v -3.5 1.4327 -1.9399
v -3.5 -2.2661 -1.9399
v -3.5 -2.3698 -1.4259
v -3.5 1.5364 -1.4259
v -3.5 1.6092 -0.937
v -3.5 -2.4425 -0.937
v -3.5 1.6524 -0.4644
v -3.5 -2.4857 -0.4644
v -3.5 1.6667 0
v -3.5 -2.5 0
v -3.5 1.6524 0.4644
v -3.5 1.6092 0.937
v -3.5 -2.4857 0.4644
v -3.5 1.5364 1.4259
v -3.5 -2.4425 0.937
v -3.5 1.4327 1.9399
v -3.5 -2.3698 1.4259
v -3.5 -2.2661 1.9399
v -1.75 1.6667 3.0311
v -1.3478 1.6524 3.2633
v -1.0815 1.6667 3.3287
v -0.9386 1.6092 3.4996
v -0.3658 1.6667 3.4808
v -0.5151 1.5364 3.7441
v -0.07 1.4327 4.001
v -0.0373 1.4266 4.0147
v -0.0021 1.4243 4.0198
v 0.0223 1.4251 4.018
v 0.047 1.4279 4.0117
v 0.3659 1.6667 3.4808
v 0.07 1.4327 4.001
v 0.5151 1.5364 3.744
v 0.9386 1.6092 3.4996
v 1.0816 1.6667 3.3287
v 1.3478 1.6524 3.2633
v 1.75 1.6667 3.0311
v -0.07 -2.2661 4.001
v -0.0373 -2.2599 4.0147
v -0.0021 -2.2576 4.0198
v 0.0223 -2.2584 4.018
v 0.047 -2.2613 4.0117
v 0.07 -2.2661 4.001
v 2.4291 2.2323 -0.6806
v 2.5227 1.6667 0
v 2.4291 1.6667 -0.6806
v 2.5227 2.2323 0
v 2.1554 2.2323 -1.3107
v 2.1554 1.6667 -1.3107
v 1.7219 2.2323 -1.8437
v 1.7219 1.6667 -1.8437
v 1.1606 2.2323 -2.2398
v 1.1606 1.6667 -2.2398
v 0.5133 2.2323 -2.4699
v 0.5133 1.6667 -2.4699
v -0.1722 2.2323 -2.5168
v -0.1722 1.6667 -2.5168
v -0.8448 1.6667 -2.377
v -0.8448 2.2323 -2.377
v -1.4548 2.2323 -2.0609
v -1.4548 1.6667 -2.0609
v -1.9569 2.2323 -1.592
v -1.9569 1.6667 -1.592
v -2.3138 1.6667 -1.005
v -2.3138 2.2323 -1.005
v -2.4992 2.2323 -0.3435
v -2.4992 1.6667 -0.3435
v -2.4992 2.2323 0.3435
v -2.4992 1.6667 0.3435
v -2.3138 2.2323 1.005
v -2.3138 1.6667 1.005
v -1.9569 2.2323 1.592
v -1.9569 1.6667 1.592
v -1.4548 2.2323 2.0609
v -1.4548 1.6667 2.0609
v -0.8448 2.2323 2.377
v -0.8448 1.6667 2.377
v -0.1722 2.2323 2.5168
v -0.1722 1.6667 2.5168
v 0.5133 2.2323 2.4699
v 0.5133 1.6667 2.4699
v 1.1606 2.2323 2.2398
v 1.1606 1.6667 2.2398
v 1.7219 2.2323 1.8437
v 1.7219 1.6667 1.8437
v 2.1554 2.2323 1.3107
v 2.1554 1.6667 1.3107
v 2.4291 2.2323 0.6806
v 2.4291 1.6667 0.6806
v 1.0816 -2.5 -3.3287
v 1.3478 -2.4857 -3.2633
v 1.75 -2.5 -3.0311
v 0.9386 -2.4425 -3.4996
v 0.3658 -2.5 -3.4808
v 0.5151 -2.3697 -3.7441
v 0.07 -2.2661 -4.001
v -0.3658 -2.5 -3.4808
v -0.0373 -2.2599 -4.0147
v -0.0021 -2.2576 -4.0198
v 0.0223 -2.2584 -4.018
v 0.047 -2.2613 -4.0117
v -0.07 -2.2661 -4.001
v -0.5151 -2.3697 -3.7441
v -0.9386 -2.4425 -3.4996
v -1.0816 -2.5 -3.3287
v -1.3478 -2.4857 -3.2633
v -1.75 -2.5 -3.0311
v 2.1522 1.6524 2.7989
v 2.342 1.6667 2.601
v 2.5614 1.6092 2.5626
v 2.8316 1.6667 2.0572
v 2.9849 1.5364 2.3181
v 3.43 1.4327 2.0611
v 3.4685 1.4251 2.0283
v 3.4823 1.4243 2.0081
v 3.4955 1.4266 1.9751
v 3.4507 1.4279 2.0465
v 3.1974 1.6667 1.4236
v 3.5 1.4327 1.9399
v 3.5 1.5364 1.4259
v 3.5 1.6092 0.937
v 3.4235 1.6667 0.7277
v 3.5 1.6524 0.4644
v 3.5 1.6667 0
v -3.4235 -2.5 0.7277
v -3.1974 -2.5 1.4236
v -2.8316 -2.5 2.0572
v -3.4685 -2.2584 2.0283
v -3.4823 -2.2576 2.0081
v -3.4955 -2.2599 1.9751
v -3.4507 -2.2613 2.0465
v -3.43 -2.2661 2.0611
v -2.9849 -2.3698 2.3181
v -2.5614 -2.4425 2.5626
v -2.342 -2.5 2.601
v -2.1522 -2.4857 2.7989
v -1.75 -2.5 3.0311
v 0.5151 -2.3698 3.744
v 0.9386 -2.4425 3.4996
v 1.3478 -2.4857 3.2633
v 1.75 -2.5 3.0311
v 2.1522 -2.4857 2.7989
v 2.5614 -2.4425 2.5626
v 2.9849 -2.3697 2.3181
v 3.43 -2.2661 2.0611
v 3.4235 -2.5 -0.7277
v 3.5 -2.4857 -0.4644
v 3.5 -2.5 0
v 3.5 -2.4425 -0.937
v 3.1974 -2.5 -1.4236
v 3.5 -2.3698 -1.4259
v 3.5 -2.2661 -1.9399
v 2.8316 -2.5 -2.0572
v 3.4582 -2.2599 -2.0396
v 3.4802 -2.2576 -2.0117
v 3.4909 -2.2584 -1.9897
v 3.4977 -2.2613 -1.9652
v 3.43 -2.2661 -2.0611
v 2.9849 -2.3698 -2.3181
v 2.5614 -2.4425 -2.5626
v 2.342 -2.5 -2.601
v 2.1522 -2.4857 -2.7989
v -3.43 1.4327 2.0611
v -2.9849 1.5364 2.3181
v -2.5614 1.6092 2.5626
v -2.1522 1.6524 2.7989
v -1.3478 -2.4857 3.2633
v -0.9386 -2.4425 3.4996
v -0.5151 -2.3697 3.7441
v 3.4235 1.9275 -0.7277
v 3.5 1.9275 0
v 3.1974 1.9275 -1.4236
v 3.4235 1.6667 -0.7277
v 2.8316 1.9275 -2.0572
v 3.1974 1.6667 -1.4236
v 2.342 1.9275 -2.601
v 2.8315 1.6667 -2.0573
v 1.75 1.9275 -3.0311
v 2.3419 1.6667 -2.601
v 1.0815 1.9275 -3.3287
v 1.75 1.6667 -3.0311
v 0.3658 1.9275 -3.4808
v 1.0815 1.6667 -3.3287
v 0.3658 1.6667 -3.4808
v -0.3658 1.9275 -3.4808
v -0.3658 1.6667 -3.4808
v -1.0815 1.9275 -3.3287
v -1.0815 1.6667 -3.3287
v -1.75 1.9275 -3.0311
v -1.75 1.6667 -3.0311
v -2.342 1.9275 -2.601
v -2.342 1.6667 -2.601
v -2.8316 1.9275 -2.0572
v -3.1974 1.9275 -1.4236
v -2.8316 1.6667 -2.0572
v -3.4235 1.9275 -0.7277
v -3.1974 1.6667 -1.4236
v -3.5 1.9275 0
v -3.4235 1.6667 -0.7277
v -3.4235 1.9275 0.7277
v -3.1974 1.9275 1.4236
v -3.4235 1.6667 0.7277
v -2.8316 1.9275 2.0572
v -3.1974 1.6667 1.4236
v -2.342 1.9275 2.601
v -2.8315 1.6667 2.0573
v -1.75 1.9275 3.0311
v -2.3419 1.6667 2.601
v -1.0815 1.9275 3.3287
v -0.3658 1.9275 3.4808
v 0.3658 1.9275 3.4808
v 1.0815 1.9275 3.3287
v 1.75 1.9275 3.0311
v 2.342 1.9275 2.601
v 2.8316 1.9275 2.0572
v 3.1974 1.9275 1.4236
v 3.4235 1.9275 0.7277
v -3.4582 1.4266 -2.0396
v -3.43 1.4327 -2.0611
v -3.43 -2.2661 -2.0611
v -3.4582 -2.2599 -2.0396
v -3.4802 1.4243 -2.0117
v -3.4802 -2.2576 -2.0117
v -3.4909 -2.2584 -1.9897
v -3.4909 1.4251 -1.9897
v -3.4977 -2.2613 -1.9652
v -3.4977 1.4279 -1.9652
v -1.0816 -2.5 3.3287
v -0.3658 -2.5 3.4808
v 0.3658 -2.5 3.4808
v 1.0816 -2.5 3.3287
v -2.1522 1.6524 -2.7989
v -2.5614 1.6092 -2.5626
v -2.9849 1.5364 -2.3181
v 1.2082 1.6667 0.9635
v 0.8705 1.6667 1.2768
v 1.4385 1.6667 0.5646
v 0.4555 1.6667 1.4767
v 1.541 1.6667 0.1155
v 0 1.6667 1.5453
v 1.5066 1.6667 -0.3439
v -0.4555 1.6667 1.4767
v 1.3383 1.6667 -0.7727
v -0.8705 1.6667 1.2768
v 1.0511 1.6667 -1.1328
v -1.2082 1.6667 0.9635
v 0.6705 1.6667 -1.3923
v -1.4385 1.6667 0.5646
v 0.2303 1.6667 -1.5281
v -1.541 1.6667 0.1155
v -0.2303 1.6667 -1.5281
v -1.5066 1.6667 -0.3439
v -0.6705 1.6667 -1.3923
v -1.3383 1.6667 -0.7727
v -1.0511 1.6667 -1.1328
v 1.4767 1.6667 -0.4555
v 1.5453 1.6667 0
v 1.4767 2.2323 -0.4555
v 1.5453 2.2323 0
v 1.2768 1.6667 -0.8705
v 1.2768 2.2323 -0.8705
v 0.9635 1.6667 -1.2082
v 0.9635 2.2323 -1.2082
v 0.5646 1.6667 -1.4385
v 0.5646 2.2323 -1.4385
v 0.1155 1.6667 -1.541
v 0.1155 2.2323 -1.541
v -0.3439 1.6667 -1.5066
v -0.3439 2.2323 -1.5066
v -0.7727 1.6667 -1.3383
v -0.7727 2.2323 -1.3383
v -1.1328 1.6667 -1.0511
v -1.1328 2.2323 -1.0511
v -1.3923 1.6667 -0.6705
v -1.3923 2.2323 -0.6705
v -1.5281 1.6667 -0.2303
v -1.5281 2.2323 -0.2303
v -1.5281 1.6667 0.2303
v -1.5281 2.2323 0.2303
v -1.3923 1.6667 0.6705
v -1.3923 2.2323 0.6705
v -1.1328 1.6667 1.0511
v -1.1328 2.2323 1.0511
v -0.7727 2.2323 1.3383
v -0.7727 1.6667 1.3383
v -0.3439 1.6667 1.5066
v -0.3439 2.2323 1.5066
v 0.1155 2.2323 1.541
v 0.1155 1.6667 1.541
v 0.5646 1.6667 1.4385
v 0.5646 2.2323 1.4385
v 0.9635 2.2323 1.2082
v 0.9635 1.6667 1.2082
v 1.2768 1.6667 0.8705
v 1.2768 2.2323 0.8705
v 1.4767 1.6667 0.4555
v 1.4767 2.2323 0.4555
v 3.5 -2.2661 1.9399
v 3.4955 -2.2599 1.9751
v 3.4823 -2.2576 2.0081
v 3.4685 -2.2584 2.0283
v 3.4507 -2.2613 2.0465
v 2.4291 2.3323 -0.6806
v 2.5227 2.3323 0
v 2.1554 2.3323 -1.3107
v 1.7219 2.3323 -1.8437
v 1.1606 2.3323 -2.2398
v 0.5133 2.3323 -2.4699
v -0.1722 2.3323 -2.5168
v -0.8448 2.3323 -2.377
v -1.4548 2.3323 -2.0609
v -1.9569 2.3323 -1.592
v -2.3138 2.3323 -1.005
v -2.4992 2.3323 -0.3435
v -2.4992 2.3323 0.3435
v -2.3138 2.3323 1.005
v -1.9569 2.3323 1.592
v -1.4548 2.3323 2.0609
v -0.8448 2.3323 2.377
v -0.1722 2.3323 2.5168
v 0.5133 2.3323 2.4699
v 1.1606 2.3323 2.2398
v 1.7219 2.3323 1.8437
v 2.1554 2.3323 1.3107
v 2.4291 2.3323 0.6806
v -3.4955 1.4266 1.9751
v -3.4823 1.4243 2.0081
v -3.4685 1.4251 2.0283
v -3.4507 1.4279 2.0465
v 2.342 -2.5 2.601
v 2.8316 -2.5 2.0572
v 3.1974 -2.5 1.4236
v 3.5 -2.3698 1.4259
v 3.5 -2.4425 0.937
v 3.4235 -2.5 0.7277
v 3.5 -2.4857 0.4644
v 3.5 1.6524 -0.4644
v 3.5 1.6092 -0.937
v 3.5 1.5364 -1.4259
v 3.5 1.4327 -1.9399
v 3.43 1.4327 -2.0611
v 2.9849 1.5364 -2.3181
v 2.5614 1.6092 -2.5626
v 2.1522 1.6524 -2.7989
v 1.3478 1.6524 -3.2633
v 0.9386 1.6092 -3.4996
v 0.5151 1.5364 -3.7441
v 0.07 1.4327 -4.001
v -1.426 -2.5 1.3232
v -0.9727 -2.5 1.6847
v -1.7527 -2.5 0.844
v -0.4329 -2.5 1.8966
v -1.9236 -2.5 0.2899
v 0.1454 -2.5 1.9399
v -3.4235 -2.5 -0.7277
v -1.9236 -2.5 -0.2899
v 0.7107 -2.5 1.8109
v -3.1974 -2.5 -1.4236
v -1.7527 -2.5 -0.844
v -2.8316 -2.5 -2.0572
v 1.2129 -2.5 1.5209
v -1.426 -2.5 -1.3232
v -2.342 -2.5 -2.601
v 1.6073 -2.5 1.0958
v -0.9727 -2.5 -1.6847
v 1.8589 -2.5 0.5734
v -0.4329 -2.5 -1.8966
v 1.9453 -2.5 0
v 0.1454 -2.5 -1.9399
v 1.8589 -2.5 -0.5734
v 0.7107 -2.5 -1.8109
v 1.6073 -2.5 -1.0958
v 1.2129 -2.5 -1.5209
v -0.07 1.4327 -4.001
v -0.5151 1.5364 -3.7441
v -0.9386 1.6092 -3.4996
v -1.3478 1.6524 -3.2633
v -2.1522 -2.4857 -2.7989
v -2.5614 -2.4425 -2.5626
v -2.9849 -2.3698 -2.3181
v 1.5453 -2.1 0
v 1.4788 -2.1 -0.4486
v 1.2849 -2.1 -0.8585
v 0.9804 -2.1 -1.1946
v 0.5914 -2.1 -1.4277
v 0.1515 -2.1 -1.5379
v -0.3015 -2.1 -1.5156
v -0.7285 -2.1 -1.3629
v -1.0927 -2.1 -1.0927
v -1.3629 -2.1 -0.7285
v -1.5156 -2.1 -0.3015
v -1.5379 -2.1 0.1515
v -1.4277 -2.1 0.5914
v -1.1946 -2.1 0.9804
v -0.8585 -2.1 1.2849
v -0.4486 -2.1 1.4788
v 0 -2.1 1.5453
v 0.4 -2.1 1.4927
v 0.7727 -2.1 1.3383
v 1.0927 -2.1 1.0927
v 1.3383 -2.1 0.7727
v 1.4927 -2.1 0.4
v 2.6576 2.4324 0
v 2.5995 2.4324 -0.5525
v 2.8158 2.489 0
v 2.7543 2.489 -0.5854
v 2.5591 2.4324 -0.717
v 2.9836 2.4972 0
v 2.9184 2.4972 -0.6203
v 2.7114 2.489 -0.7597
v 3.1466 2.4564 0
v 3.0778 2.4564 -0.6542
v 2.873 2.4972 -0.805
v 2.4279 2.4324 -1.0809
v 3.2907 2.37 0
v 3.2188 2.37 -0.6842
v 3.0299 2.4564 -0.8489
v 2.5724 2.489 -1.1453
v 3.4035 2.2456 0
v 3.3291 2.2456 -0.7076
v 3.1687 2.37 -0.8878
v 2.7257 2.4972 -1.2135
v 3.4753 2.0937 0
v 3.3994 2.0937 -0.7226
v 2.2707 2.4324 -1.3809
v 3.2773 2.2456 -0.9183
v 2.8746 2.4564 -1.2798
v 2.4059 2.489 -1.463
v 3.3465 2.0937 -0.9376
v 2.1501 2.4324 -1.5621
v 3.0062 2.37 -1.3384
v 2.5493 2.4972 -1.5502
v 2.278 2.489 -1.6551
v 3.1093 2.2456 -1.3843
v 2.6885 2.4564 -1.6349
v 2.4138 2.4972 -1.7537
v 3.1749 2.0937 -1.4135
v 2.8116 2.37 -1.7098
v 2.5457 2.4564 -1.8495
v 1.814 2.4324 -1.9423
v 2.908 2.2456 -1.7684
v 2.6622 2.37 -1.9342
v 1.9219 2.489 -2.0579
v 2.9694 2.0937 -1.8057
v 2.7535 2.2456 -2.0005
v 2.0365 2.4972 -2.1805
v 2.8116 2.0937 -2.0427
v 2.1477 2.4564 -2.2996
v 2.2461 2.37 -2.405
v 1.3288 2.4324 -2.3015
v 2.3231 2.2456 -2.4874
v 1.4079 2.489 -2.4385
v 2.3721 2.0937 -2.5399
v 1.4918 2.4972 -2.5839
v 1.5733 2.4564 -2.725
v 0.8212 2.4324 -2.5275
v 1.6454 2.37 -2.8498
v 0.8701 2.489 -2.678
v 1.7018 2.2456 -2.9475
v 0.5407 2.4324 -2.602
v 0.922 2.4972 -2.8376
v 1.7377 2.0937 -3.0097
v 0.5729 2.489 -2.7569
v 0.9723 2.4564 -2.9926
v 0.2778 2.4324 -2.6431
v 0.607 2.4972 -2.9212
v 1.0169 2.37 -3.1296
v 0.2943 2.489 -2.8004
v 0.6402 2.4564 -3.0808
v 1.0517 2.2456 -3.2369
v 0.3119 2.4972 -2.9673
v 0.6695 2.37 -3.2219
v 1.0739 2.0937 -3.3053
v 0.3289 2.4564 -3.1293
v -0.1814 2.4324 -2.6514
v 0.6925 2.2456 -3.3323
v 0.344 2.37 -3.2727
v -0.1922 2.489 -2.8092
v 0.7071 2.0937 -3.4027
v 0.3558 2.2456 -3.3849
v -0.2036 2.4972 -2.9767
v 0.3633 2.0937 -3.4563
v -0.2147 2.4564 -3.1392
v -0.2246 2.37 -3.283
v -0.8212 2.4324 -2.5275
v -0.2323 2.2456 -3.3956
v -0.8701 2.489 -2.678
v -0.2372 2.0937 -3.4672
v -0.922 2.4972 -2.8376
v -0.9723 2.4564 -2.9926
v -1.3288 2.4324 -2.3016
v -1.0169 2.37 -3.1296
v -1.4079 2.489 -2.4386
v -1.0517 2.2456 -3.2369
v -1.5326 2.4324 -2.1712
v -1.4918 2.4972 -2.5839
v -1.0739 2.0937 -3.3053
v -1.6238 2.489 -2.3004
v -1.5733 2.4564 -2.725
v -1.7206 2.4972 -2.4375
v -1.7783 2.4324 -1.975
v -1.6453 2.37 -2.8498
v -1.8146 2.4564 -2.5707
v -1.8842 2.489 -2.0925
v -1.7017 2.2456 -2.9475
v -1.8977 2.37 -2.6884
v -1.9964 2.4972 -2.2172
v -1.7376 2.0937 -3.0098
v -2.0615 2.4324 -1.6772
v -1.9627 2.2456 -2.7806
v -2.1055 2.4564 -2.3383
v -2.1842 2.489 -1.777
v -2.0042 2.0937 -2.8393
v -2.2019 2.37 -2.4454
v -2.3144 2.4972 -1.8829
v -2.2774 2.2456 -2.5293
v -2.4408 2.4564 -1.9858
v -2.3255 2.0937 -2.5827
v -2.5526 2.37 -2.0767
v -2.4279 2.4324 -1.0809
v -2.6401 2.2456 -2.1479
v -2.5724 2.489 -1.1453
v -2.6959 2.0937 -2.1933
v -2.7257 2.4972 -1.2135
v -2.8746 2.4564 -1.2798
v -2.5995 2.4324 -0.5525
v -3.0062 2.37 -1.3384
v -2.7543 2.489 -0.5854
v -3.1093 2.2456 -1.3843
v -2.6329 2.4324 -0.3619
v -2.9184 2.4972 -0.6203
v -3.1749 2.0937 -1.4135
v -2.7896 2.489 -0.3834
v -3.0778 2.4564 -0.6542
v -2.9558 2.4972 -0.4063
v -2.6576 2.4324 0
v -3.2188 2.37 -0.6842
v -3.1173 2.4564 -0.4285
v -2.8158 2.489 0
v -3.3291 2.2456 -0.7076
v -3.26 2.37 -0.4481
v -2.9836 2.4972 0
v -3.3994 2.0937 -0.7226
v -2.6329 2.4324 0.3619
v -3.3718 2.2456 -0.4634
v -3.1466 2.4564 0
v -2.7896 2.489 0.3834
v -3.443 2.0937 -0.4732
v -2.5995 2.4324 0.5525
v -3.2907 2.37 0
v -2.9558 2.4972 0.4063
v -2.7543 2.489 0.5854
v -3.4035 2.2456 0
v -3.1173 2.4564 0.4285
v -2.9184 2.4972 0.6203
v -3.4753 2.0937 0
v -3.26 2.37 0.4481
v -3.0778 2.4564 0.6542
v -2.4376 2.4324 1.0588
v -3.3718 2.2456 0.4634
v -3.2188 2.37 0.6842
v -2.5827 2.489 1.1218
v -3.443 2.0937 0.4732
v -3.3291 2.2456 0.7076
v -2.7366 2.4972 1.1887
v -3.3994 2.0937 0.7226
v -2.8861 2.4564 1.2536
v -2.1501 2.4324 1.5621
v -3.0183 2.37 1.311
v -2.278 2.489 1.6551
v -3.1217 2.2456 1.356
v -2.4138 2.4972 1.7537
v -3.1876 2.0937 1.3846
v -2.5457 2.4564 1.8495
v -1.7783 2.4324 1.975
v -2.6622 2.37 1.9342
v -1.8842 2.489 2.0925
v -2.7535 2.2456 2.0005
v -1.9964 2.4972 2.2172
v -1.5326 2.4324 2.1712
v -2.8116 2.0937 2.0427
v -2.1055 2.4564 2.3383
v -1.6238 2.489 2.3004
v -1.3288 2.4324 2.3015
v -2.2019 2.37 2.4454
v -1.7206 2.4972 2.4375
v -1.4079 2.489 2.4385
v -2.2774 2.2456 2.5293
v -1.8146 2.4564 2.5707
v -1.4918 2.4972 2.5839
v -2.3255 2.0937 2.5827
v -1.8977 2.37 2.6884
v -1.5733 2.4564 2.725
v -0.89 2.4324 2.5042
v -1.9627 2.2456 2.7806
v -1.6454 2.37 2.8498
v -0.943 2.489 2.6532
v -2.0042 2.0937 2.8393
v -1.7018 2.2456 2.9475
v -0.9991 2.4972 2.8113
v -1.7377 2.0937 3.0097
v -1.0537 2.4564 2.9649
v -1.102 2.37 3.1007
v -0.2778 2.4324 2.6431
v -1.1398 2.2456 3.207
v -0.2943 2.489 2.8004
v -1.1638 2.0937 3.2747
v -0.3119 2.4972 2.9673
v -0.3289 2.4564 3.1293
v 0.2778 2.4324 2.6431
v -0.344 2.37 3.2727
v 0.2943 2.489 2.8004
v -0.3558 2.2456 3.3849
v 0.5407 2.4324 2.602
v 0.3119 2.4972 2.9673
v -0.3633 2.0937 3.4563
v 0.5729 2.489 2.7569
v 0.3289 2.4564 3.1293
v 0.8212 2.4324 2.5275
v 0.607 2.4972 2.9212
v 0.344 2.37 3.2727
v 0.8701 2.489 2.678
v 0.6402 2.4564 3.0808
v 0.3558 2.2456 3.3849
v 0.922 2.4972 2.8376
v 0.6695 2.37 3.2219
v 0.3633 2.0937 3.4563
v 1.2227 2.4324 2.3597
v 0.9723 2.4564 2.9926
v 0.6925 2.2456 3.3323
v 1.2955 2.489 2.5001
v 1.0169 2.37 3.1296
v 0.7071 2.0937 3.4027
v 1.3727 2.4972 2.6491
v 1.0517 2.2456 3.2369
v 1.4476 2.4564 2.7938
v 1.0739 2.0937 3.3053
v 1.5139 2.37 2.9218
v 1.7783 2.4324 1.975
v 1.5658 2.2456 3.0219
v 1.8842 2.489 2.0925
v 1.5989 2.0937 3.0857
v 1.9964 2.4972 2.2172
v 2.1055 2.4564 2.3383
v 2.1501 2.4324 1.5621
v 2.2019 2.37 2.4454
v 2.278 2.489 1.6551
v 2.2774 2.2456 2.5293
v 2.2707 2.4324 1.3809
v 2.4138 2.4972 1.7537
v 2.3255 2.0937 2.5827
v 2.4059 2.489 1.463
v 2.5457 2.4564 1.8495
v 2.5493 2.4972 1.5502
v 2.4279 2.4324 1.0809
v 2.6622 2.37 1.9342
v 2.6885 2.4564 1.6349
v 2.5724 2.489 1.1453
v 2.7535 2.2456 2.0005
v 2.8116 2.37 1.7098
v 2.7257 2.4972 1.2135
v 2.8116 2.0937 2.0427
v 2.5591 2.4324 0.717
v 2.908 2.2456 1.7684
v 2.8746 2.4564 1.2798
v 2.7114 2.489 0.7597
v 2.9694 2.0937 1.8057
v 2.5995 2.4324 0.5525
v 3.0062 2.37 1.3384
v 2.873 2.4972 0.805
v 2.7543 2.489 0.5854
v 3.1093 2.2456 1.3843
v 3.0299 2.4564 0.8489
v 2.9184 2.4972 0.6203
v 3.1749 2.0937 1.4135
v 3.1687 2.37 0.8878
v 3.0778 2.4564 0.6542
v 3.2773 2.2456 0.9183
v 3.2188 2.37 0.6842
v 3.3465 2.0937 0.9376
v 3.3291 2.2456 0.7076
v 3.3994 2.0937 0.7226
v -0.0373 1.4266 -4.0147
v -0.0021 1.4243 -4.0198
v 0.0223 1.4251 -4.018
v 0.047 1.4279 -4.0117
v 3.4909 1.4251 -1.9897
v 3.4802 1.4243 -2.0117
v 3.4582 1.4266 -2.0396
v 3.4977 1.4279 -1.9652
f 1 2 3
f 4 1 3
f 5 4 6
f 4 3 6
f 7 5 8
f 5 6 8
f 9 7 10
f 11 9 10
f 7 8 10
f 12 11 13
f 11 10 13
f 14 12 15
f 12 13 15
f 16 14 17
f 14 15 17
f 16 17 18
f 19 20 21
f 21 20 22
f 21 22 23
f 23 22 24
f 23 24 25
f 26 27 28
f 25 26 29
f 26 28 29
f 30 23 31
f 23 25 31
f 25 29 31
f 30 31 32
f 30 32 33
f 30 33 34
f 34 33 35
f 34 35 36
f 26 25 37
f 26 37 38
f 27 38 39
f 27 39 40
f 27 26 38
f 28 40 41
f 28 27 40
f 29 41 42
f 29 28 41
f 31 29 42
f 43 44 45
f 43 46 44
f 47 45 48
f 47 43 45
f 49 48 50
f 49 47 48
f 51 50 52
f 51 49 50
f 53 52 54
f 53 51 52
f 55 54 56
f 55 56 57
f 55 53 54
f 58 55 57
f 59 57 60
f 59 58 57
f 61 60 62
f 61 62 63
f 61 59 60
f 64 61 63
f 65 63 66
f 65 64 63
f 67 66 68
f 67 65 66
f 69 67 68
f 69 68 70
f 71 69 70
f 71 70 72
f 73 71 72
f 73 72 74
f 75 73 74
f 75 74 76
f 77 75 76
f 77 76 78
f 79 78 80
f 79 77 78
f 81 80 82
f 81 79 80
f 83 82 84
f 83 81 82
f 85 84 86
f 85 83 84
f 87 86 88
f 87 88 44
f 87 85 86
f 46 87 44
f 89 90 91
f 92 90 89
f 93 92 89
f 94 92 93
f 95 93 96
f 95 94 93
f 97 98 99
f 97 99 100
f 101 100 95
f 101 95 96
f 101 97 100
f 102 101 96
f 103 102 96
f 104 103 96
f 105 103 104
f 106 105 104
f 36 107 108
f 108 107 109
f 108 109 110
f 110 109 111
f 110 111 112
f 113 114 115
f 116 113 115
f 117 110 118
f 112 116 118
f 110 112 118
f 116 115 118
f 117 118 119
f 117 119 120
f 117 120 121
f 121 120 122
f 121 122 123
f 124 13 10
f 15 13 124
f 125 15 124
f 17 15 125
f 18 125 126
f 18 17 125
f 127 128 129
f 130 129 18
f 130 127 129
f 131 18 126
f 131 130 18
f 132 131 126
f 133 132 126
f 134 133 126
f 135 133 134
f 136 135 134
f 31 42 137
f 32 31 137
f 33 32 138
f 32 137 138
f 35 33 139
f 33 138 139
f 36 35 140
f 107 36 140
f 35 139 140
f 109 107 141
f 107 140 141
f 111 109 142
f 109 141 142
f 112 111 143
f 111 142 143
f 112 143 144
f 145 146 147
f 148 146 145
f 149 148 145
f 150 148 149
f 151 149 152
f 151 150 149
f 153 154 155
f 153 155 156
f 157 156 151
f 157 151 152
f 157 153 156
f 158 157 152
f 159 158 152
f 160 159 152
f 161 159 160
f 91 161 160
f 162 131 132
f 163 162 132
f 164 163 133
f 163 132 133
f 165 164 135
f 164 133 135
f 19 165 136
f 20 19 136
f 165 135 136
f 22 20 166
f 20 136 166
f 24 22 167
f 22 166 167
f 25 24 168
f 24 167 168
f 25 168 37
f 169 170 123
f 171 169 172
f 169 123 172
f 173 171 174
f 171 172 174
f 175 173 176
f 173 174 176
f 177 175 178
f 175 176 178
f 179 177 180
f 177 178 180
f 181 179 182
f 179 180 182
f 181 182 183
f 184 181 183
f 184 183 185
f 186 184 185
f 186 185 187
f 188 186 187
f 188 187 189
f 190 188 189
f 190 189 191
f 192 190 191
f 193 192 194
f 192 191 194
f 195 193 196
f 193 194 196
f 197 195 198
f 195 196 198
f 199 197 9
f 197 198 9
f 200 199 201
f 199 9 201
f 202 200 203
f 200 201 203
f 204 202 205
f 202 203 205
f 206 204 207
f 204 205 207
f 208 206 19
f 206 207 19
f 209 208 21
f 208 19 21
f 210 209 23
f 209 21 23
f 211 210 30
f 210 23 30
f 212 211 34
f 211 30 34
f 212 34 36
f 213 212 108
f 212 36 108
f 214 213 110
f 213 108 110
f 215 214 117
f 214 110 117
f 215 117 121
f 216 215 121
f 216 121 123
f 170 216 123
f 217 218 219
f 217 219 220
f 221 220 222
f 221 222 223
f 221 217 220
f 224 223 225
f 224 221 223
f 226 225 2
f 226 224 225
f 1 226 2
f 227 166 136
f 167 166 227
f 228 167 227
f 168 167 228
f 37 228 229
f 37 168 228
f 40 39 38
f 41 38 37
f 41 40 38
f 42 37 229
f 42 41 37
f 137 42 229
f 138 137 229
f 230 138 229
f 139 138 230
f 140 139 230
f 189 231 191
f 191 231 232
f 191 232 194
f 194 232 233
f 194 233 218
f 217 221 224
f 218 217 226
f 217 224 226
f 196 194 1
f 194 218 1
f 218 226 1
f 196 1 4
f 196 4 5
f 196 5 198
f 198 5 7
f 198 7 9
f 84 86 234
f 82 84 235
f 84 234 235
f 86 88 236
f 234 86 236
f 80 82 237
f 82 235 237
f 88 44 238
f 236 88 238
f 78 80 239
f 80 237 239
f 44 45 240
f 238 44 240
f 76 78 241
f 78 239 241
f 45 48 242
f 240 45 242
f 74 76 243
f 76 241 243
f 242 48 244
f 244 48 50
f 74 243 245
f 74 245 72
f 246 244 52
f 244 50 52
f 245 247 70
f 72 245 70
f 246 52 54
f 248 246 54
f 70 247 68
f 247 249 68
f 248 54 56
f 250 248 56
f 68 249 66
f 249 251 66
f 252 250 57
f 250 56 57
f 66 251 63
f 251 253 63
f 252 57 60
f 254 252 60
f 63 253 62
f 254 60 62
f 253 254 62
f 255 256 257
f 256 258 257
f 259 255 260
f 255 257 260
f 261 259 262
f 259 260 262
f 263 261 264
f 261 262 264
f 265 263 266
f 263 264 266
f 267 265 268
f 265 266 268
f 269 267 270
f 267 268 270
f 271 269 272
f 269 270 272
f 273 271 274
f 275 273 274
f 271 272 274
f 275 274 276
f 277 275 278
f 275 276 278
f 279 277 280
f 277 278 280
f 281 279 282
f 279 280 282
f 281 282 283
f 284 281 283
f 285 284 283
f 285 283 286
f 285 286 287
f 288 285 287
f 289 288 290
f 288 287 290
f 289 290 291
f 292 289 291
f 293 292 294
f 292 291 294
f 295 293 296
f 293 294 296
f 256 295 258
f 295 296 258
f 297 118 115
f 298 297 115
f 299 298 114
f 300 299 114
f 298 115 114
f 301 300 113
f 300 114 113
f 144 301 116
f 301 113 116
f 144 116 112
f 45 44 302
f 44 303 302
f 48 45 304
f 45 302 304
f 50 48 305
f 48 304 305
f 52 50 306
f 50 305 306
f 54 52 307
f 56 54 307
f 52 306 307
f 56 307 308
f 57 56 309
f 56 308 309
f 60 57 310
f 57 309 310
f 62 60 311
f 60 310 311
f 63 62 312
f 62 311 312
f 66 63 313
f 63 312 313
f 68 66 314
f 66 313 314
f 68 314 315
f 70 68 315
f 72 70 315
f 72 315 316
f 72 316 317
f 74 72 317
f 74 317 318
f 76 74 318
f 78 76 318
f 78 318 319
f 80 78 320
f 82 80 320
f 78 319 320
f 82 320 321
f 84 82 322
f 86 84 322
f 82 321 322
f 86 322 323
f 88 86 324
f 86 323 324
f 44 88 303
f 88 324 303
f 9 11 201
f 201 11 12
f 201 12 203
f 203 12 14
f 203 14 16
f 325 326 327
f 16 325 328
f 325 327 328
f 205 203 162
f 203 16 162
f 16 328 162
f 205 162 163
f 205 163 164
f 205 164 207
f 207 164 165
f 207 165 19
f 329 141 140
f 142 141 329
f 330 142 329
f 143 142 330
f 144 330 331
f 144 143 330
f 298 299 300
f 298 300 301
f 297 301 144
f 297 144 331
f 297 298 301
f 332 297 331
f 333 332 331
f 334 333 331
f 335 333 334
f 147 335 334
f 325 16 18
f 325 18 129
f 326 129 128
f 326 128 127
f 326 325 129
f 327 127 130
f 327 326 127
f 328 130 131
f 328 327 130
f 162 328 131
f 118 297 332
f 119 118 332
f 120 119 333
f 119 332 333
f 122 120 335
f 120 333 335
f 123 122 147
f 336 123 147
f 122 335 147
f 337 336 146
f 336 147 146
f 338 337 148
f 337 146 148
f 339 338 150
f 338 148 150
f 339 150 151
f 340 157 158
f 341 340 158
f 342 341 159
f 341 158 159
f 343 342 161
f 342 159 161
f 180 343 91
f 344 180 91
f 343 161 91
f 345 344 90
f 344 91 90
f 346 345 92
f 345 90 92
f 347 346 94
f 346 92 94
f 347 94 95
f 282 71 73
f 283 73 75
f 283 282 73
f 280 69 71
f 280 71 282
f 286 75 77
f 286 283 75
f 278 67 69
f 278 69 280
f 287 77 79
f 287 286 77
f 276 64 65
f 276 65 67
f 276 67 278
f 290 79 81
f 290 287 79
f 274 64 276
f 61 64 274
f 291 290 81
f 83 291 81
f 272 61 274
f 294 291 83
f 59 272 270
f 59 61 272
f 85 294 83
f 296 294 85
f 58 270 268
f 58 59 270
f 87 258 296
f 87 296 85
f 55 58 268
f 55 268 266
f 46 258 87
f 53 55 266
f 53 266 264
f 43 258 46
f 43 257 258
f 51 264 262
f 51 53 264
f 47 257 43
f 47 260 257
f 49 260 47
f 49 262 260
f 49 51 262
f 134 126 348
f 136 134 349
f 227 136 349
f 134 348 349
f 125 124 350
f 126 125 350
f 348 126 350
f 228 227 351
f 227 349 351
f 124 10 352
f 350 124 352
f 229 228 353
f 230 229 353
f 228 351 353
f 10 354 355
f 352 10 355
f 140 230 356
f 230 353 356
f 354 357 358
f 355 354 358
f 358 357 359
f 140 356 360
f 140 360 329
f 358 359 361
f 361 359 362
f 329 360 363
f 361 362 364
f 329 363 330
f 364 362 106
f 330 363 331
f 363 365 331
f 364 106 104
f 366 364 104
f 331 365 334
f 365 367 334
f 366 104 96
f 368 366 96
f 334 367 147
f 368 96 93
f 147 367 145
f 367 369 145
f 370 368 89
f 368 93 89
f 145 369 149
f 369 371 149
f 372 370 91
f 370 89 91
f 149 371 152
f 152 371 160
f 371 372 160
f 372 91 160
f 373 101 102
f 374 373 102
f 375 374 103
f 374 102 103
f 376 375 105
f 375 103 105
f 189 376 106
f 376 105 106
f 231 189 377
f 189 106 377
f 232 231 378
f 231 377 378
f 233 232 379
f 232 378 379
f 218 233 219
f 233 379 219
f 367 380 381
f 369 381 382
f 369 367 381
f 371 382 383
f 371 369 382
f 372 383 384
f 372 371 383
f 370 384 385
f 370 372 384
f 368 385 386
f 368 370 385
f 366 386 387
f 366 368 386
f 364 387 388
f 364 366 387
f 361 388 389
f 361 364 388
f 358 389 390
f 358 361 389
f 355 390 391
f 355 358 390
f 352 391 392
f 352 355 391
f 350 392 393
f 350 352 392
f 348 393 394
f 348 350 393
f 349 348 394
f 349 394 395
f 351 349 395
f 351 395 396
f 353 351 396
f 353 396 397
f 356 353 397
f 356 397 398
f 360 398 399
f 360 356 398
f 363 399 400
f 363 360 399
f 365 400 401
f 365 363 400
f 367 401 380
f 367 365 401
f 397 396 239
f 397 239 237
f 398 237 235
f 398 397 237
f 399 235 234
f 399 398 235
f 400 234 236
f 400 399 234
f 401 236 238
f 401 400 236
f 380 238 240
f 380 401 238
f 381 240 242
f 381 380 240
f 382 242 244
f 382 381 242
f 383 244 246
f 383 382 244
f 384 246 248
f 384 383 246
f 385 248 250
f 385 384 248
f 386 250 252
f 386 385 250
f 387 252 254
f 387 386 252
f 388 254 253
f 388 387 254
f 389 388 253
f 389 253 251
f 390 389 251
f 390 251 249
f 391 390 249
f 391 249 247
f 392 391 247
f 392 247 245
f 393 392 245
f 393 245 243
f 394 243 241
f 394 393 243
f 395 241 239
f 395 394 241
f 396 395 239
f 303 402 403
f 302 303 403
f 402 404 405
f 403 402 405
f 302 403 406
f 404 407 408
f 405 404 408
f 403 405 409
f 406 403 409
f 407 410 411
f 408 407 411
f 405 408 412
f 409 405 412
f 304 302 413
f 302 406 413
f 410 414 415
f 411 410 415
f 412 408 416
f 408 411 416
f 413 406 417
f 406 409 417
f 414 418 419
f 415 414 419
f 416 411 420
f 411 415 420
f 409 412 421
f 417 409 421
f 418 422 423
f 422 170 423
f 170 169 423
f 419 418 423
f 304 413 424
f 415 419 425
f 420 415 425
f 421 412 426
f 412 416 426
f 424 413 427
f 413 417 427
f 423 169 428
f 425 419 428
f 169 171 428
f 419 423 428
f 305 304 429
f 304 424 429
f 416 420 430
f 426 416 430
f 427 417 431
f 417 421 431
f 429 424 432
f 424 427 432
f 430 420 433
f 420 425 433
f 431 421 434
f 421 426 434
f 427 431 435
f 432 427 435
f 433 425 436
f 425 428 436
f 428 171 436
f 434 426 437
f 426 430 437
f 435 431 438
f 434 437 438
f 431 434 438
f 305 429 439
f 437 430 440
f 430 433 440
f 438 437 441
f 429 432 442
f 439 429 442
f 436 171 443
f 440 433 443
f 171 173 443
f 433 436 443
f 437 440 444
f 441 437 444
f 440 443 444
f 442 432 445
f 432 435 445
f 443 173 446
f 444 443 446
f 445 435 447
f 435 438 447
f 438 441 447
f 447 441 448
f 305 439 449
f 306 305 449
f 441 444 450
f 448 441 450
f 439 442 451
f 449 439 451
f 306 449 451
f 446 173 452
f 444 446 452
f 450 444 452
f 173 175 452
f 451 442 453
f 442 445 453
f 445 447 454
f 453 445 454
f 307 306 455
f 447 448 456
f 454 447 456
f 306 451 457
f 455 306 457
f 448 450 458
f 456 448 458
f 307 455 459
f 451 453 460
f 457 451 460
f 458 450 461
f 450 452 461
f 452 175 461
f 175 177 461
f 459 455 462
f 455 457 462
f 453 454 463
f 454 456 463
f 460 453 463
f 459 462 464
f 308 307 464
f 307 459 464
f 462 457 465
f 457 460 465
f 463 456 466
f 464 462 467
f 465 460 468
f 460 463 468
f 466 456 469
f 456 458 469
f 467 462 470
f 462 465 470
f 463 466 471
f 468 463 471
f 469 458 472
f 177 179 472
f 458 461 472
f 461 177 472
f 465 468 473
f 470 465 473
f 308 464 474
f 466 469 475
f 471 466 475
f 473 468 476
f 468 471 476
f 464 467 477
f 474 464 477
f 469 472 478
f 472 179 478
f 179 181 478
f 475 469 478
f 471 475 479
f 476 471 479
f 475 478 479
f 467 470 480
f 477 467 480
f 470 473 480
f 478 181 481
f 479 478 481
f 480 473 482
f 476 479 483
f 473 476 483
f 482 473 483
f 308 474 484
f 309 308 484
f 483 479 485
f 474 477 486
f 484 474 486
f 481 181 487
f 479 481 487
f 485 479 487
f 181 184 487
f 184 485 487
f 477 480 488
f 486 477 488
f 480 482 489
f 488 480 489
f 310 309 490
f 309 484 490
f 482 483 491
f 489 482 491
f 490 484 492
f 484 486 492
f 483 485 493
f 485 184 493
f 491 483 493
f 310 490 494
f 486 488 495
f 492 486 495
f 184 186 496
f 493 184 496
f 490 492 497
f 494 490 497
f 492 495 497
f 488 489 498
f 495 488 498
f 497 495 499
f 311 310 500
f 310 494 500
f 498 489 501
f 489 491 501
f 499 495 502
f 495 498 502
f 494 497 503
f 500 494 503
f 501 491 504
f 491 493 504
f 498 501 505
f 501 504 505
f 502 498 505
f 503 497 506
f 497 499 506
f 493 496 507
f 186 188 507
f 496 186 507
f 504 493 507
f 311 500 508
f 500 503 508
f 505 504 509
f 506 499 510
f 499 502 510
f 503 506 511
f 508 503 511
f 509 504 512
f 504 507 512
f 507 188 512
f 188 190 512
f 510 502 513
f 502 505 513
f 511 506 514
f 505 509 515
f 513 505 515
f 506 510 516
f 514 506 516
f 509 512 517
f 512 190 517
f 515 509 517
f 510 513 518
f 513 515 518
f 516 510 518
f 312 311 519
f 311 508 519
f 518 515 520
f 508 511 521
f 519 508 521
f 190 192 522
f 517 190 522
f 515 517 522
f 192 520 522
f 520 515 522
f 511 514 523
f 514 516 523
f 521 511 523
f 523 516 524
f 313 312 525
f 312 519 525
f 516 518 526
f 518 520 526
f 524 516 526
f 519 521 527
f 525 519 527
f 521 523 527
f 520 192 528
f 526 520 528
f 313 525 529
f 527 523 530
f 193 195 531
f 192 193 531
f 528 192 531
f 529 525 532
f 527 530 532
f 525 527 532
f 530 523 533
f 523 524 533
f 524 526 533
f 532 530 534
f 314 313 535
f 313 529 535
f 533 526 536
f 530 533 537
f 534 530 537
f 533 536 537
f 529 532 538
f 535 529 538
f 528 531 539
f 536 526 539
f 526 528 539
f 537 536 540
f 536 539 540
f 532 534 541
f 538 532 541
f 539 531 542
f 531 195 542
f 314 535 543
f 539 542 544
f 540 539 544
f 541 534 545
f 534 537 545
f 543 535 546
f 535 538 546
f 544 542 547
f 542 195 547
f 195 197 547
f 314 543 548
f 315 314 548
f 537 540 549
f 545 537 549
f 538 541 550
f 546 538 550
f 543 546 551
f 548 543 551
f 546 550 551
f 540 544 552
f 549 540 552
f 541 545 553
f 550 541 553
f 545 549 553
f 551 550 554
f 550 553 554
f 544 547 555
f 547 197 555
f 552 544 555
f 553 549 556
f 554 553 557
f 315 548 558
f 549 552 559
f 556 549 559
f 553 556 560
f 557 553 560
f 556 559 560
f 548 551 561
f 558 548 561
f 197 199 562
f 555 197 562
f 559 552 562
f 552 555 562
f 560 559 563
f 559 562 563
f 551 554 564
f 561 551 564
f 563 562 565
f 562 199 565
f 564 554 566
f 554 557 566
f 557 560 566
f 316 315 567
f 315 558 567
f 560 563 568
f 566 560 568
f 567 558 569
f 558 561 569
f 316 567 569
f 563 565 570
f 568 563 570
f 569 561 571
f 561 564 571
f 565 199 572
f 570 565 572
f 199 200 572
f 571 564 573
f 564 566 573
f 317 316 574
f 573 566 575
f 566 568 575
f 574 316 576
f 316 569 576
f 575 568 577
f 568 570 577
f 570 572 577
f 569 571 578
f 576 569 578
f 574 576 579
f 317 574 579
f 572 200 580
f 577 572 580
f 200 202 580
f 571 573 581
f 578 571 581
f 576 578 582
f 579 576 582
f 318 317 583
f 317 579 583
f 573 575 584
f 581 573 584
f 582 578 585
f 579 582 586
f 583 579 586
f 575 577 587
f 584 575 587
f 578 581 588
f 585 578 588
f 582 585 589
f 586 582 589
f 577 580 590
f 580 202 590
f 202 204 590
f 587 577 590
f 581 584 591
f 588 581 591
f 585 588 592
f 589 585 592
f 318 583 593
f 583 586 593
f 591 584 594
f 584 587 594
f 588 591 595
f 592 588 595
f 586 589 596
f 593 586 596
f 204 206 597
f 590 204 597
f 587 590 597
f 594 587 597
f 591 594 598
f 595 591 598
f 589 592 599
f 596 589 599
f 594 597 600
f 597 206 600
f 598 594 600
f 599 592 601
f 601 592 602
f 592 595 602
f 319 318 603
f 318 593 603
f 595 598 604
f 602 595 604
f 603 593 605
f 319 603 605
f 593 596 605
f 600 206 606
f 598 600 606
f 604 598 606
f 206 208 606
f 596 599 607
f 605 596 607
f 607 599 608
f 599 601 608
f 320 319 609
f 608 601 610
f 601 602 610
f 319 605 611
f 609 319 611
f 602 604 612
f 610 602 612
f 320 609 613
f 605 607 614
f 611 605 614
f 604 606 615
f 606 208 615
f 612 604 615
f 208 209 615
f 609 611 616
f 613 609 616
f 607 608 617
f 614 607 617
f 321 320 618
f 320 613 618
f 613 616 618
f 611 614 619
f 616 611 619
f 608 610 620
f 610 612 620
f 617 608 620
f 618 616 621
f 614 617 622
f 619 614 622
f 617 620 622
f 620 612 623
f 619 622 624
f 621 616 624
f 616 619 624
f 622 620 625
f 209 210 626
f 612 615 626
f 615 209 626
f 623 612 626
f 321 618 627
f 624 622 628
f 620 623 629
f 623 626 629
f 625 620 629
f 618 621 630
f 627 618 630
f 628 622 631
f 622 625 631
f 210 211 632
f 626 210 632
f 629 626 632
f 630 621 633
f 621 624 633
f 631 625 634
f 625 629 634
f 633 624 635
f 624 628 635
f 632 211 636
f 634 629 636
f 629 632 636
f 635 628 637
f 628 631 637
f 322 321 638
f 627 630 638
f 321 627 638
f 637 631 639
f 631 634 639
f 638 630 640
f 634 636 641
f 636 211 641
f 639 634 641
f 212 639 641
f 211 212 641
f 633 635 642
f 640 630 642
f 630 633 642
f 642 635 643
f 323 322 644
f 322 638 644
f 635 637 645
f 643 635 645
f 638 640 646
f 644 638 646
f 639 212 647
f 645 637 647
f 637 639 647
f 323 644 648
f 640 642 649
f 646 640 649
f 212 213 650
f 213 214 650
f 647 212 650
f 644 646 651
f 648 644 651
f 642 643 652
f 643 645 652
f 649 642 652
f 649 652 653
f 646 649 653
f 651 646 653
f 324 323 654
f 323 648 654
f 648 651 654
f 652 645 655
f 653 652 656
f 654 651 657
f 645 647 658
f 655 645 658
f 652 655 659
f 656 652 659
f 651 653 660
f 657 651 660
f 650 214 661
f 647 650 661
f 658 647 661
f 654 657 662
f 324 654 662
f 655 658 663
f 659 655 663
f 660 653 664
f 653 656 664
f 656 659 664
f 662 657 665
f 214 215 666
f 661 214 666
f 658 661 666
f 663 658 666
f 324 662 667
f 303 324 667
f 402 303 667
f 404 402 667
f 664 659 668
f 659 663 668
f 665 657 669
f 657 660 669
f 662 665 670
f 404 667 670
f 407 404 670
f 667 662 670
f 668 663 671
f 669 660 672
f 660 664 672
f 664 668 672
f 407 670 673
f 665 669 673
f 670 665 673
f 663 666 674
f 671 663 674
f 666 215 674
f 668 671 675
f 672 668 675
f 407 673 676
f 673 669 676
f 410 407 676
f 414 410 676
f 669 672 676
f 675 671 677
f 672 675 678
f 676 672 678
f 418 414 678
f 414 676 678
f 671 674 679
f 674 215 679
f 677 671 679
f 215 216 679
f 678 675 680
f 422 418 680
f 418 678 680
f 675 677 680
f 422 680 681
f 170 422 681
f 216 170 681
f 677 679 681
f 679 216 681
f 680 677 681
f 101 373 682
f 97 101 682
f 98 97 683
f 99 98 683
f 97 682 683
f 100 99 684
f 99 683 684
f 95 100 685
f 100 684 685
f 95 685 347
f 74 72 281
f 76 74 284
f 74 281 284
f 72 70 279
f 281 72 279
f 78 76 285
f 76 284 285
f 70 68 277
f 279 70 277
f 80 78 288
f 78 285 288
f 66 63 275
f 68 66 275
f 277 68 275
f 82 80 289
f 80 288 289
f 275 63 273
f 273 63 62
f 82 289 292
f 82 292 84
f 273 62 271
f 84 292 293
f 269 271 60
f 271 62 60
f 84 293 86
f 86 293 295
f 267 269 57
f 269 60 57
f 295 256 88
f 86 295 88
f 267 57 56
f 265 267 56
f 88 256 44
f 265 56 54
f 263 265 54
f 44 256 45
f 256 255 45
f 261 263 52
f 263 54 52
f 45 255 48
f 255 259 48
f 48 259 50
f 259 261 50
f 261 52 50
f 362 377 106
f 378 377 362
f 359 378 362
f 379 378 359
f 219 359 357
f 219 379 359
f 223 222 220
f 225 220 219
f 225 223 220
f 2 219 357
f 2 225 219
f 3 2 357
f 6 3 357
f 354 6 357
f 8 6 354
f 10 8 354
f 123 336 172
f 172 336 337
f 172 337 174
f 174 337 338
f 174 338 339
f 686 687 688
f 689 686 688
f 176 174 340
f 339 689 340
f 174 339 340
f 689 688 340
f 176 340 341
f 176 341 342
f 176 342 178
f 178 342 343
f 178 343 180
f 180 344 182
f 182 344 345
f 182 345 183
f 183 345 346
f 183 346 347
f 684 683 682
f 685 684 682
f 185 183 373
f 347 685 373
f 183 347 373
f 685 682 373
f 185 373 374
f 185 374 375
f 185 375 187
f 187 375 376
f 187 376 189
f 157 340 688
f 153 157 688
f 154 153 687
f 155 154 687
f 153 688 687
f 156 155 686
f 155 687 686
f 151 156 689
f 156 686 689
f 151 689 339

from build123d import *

# Parameters (mm, degrees)
BOSS_EXTRUDE1_DEPTH      = 2.5
BOSS_EXTRUDE1_DEPTH_BACK = 2.5
SKETCH2_R                = 1.545336663
FILLET1_R                = 0.14
SKETCH4_W                = 0.977331669
SKETCH4_H                = 0.565649729


with BuildPart() as part:
    # Sketch2 → Boss-Extrude1 (new, two sides: drawn at the far end of the back side and taken through both)
    with BuildSketch(Plane(origin=(0, 0, 0), x_dir=(1, 0, 0), z_dir=(0, 1, 0)).offset(-BOSS_EXTRUDE1_DEPTH_BACK)):
        Polygon((0, 4.041451884), (-3.5, 2.020725942), (-3.5, -2.020725942), (0, -4.041451884), (3.5, -2.020725942), (3.5, 2.020725942), align=None)
        with Locations(Location((0, 0, 0), (0, 0, 270))):
            Circle(SKETCH2_R, mode=Mode.SUBTRACT)
    extrude(amount=BOSS_EXTRUDE1_DEPTH + BOSS_EXTRUDE1_DEPTH_BACK)

    # Fillet1
    fillet1_edges = [part.edges().sort_by_distance(p)[0] for p in [
        (3.5, 0, -2.020725942),
        (3.5, 0, 2.020725942),
        (0, 0, 4.041451884),
        (-3.5, 0, 2.020725942),
        (-3.5, 0, -2.020725942),
        (0, 0, -4.041451884),
    ]]
    fillet(fillet1_edges, radius=FILLET1_R)

    # Sketch3 → Cut-Revolve2 (revolve, cut)
    with BuildSketch(Plane(origin=(0, 0, 0), x_dir=(0, 0, -1), z_dir=(1, 0, 0)), mode=Mode.PRIVATE) as cut_revolve2_sk:
        with BuildLine():
            Line((4.041451884, 1.666666667), (4.041451884, 3.5))
            Line((4.041451884, 3.5), (1.545336663, 3.5))
            Line((1.545336663, 3.5), (1.545336663, 1.666666667))
            Line((1.545336663, 1.666666667), (2.522668332, 1.666666667))
            Line((2.522668332, 1.666666667), (2.522668332, 2.332316396))
            ThreePointArc((2.522668332, 2.332316396), (3.146581551, 2.456420451), (3.5, 1.927492364))
            Line((3.5, 1.927492364), (3.5, 1.666666667))
            Line((3.5, 1.666666667), (4.041451884, 1.414183506))
            Line((4.041451884, 1.414183506), (4.041451884, 1.666666667))
        make_face()
        Polygon((3.5, -2.5), (4.041451884, -2.24751684), (4.041451884, -2.5), align=None)
        Polygon((1.545336663, -2.5), (1.545336663, -2.1), (1.945336663, -2.5), align=None)
    revolve(cut_revolve2_sk.sketch.rotate(Axis((0, -2.5, 0), (0, 1, 0)), 270), axis=Axis((0, -2.5, 0), (0, 1, 0)), mode=Mode.SUBTRACT)


with BuildPart() as body_2:
    # Sketch4 → Revolve1 (revolve)
    with BuildSketch(Plane(origin=(0, 0, 0), x_dir=(0, 0, -1), z_dir=(1, 0, 0)), mode=Mode.PRIVATE) as revolve1_sk:
        with Locations((-2.034002498, 1.949491532)):
            Rectangle(SKETCH4_W, SKETCH4_H)
    revolve(revolve1_sk.sketch.rotate(Axis((0, -2.5, 0), (0, 1, 0)), 90), axis=Axis((0, -2.5, 0), (0, 1, 0)))


solid = Compound([part.part, body_2.part])
